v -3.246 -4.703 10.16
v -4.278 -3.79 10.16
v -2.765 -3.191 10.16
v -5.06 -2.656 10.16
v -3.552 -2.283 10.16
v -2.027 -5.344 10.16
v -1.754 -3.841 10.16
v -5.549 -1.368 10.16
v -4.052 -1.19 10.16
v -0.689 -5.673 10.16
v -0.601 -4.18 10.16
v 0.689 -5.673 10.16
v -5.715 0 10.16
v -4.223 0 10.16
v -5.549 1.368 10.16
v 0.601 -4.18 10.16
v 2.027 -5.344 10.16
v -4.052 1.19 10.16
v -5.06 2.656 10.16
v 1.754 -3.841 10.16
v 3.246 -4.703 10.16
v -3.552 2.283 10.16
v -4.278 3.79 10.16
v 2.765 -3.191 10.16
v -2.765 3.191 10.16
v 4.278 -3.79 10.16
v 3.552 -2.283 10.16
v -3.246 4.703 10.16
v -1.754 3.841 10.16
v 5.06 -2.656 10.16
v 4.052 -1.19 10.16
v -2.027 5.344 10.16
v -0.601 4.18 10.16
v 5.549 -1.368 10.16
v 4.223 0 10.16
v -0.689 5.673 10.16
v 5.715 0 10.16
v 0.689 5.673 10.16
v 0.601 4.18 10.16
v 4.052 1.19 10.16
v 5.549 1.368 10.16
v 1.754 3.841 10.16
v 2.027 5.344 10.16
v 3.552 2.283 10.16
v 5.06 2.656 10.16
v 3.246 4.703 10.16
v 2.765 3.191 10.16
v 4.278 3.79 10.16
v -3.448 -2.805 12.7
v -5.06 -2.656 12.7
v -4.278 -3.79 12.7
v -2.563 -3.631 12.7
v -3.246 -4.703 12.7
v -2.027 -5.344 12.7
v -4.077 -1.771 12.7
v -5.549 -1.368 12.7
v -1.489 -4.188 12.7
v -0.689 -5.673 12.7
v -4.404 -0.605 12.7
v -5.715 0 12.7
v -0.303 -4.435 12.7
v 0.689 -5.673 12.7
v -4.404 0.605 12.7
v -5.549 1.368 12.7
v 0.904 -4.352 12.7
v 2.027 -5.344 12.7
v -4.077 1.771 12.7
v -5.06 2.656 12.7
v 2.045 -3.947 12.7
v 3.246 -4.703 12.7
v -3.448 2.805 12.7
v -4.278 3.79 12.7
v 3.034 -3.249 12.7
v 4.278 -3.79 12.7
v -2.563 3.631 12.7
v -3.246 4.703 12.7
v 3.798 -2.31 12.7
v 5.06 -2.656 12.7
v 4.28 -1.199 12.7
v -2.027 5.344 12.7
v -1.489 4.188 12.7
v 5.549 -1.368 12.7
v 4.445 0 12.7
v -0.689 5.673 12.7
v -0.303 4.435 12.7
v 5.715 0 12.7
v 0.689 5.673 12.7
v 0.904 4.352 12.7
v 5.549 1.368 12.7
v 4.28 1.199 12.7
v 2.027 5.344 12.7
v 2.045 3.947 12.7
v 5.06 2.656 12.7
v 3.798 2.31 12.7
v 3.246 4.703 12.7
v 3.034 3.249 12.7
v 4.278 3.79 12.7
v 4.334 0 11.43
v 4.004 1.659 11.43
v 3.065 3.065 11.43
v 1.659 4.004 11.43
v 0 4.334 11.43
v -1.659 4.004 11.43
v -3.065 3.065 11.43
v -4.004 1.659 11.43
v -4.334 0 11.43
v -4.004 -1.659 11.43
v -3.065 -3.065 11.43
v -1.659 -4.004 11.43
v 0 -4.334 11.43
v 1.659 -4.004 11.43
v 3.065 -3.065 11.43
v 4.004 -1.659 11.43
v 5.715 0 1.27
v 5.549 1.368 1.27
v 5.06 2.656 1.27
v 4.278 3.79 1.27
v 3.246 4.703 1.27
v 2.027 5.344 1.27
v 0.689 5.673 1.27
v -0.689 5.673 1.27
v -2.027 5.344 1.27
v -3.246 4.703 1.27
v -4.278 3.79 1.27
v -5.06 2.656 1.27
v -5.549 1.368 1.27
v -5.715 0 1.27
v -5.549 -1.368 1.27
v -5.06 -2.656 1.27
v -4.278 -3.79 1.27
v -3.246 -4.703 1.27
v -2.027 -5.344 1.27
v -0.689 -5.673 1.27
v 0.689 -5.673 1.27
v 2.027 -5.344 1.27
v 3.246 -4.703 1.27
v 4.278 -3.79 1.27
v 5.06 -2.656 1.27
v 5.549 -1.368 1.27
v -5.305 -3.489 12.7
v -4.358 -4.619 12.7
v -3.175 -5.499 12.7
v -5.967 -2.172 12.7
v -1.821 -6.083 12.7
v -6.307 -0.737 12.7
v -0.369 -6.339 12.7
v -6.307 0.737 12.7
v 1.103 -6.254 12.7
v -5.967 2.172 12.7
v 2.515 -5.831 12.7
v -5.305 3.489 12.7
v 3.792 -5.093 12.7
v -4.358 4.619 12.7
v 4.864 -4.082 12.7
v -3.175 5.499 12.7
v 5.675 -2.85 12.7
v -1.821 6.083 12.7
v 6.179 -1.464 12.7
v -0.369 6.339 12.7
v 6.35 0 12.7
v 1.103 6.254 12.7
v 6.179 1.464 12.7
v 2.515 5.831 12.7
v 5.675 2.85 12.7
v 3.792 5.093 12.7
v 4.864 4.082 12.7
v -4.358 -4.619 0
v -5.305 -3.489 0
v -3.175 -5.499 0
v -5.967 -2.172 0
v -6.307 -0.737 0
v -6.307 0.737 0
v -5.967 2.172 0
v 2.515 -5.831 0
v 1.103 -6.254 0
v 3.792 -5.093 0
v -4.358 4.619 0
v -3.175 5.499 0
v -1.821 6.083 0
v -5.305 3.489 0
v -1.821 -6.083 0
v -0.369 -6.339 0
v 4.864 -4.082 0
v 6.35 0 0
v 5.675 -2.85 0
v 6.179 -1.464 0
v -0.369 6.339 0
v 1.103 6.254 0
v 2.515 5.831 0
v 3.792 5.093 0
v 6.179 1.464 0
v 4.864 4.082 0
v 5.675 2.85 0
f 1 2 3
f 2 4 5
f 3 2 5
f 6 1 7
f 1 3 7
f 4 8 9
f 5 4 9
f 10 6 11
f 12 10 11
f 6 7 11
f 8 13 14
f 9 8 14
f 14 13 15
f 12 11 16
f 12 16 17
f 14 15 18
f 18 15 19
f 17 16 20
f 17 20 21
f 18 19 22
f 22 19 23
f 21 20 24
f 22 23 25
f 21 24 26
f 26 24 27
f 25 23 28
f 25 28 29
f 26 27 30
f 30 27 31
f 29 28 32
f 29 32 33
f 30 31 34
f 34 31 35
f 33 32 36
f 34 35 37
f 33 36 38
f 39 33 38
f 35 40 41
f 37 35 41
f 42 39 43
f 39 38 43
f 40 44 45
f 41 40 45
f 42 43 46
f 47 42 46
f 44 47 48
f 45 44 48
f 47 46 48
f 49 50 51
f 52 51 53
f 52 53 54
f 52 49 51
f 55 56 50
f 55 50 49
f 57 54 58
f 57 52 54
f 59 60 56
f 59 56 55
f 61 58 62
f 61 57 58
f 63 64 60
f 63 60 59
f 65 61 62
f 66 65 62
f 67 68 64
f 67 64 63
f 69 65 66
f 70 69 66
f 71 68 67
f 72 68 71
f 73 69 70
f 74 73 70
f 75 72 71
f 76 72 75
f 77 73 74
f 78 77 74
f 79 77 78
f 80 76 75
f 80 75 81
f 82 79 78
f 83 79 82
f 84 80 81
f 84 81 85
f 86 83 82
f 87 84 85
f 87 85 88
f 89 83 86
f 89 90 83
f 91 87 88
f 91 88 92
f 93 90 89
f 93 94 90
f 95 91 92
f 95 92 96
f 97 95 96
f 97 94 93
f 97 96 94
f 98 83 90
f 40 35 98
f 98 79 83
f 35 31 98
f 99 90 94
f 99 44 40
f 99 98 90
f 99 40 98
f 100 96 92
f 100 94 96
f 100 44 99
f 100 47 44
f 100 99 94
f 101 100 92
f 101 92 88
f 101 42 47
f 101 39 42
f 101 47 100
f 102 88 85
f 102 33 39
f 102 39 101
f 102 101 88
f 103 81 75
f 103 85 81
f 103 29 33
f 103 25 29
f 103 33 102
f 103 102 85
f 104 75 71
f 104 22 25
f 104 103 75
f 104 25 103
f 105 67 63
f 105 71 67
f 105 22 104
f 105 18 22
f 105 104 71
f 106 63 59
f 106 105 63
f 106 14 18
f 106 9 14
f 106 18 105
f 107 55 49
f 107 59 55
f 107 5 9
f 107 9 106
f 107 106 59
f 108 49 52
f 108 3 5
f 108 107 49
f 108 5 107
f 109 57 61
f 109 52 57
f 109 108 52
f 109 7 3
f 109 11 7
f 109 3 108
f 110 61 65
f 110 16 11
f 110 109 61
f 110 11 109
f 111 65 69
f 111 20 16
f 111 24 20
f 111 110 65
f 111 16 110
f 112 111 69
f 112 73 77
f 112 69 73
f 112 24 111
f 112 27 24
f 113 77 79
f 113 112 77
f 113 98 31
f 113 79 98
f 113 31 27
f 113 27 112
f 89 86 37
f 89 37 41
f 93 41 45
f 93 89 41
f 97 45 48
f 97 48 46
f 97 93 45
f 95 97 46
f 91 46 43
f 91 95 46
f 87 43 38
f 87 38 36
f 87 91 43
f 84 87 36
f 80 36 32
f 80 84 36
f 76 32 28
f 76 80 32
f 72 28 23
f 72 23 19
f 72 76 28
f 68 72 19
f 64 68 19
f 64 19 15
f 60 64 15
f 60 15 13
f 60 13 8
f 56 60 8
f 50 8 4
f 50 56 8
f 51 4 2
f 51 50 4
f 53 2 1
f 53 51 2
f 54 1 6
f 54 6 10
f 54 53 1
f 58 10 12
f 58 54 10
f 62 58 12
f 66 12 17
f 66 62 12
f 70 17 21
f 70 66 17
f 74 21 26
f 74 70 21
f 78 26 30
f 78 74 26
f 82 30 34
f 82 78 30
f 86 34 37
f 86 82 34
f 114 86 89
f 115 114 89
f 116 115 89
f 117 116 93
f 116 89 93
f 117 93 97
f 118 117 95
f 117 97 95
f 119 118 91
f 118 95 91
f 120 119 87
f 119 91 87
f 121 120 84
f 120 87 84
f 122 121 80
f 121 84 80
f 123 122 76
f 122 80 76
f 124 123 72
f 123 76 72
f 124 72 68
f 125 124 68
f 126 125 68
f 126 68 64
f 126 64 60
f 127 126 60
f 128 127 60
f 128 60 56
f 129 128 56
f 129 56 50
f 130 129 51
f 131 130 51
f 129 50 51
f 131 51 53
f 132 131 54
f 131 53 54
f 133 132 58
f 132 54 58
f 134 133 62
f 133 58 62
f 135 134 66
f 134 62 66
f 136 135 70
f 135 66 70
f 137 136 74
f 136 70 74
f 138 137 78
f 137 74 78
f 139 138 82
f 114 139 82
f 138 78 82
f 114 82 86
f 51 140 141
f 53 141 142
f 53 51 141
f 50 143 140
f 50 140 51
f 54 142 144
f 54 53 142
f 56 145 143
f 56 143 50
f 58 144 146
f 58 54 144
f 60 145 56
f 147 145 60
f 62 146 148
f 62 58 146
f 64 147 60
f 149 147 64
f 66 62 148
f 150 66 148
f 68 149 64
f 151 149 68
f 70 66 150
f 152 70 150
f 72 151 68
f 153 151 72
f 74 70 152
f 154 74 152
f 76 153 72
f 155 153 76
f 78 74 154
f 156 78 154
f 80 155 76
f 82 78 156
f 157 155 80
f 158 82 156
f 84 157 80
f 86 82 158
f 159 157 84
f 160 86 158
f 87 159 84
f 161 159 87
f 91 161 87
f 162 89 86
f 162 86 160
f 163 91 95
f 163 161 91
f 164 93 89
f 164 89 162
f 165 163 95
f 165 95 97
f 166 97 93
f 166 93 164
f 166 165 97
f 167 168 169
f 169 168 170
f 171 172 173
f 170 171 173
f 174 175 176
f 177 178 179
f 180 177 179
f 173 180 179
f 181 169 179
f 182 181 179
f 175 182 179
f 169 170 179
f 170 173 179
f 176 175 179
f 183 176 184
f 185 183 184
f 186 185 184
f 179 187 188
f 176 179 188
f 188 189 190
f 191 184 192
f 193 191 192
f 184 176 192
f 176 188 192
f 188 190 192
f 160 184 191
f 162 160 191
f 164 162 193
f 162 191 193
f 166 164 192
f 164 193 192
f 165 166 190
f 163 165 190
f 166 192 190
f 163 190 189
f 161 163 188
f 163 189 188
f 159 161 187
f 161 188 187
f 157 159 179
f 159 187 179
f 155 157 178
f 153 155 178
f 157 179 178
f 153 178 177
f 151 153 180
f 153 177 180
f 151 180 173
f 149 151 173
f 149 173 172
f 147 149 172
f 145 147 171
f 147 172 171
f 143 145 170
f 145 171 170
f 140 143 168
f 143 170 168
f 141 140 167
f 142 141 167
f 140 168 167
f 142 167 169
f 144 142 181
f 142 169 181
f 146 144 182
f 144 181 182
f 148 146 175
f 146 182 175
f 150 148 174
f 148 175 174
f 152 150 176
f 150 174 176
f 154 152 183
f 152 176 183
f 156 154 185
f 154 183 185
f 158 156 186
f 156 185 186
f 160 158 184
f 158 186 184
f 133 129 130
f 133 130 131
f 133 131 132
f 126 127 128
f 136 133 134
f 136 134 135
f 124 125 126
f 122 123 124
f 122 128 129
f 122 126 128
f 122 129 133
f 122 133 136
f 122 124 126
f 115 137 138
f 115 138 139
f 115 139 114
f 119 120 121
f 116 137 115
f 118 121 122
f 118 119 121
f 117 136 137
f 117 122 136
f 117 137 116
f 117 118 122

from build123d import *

# Parameters (mm, degrees)
F0_R     = 6.35
F1_DEPTH = 12.7
F2_R     = 5.715
F2_R_2   = 4.445
F3_DEPTH = 11.43
F4_DEPTH = 2.54
F5_DEPTH = 11.43
F6_DEPTH = 2.54
F7_DEPTH = 2.54
F7_TAPER = 5


with BuildPart() as f1:
    # F0 (on Top) → F1 (new body)
    with BuildSketch(Plane.XY):
        Circle(F0_R)
    extrude(amount=F1_DEPTH)

    # F2 (on face) → F3 (cut)
    with BuildSketch(Plane.XY.offset(12.7)):
        Circle(F2_R)
        Circle(F2_R_2, mode=Mode.SUBTRACT)
    extrude(amount=-F3_DEPTH, mode=Mode.SUBTRACT)

    # F2 (on face) → F5 (cut)
    with BuildSketch(Plane.XY.offset(12.7)):
        Circle(F2_R_2)
    extrude(amount=-F5_DEPTH, mode=Mode.SUBTRACT)


with BuildPart() as f4:
    # F2 (on face) → F4 (new body)
    with BuildSketch(Plane.XY.offset(12.7)):
        Circle(F2_R)
        Circle(F2_R_2, mode=Mode.SUBTRACT)
    extrude(amount=-F4_DEPTH)

    # F2 (on face) → F6 (join)
    with BuildSketch(Plane.XY.offset(12.7)):
        Circle(F2_R_2)
    extrude(amount=-F6_DEPTH)

    # F2 (on face) → F7 (cut)
    with BuildSketch(Plane.XY.offset(12.7)):
        Circle(F2_R_2)
    extrude(amount=-F7_DEPTH, taper=F7_TAPER, mode=Mode.SUBTRACT)


solid = Compound([f1.part, f4.part])
